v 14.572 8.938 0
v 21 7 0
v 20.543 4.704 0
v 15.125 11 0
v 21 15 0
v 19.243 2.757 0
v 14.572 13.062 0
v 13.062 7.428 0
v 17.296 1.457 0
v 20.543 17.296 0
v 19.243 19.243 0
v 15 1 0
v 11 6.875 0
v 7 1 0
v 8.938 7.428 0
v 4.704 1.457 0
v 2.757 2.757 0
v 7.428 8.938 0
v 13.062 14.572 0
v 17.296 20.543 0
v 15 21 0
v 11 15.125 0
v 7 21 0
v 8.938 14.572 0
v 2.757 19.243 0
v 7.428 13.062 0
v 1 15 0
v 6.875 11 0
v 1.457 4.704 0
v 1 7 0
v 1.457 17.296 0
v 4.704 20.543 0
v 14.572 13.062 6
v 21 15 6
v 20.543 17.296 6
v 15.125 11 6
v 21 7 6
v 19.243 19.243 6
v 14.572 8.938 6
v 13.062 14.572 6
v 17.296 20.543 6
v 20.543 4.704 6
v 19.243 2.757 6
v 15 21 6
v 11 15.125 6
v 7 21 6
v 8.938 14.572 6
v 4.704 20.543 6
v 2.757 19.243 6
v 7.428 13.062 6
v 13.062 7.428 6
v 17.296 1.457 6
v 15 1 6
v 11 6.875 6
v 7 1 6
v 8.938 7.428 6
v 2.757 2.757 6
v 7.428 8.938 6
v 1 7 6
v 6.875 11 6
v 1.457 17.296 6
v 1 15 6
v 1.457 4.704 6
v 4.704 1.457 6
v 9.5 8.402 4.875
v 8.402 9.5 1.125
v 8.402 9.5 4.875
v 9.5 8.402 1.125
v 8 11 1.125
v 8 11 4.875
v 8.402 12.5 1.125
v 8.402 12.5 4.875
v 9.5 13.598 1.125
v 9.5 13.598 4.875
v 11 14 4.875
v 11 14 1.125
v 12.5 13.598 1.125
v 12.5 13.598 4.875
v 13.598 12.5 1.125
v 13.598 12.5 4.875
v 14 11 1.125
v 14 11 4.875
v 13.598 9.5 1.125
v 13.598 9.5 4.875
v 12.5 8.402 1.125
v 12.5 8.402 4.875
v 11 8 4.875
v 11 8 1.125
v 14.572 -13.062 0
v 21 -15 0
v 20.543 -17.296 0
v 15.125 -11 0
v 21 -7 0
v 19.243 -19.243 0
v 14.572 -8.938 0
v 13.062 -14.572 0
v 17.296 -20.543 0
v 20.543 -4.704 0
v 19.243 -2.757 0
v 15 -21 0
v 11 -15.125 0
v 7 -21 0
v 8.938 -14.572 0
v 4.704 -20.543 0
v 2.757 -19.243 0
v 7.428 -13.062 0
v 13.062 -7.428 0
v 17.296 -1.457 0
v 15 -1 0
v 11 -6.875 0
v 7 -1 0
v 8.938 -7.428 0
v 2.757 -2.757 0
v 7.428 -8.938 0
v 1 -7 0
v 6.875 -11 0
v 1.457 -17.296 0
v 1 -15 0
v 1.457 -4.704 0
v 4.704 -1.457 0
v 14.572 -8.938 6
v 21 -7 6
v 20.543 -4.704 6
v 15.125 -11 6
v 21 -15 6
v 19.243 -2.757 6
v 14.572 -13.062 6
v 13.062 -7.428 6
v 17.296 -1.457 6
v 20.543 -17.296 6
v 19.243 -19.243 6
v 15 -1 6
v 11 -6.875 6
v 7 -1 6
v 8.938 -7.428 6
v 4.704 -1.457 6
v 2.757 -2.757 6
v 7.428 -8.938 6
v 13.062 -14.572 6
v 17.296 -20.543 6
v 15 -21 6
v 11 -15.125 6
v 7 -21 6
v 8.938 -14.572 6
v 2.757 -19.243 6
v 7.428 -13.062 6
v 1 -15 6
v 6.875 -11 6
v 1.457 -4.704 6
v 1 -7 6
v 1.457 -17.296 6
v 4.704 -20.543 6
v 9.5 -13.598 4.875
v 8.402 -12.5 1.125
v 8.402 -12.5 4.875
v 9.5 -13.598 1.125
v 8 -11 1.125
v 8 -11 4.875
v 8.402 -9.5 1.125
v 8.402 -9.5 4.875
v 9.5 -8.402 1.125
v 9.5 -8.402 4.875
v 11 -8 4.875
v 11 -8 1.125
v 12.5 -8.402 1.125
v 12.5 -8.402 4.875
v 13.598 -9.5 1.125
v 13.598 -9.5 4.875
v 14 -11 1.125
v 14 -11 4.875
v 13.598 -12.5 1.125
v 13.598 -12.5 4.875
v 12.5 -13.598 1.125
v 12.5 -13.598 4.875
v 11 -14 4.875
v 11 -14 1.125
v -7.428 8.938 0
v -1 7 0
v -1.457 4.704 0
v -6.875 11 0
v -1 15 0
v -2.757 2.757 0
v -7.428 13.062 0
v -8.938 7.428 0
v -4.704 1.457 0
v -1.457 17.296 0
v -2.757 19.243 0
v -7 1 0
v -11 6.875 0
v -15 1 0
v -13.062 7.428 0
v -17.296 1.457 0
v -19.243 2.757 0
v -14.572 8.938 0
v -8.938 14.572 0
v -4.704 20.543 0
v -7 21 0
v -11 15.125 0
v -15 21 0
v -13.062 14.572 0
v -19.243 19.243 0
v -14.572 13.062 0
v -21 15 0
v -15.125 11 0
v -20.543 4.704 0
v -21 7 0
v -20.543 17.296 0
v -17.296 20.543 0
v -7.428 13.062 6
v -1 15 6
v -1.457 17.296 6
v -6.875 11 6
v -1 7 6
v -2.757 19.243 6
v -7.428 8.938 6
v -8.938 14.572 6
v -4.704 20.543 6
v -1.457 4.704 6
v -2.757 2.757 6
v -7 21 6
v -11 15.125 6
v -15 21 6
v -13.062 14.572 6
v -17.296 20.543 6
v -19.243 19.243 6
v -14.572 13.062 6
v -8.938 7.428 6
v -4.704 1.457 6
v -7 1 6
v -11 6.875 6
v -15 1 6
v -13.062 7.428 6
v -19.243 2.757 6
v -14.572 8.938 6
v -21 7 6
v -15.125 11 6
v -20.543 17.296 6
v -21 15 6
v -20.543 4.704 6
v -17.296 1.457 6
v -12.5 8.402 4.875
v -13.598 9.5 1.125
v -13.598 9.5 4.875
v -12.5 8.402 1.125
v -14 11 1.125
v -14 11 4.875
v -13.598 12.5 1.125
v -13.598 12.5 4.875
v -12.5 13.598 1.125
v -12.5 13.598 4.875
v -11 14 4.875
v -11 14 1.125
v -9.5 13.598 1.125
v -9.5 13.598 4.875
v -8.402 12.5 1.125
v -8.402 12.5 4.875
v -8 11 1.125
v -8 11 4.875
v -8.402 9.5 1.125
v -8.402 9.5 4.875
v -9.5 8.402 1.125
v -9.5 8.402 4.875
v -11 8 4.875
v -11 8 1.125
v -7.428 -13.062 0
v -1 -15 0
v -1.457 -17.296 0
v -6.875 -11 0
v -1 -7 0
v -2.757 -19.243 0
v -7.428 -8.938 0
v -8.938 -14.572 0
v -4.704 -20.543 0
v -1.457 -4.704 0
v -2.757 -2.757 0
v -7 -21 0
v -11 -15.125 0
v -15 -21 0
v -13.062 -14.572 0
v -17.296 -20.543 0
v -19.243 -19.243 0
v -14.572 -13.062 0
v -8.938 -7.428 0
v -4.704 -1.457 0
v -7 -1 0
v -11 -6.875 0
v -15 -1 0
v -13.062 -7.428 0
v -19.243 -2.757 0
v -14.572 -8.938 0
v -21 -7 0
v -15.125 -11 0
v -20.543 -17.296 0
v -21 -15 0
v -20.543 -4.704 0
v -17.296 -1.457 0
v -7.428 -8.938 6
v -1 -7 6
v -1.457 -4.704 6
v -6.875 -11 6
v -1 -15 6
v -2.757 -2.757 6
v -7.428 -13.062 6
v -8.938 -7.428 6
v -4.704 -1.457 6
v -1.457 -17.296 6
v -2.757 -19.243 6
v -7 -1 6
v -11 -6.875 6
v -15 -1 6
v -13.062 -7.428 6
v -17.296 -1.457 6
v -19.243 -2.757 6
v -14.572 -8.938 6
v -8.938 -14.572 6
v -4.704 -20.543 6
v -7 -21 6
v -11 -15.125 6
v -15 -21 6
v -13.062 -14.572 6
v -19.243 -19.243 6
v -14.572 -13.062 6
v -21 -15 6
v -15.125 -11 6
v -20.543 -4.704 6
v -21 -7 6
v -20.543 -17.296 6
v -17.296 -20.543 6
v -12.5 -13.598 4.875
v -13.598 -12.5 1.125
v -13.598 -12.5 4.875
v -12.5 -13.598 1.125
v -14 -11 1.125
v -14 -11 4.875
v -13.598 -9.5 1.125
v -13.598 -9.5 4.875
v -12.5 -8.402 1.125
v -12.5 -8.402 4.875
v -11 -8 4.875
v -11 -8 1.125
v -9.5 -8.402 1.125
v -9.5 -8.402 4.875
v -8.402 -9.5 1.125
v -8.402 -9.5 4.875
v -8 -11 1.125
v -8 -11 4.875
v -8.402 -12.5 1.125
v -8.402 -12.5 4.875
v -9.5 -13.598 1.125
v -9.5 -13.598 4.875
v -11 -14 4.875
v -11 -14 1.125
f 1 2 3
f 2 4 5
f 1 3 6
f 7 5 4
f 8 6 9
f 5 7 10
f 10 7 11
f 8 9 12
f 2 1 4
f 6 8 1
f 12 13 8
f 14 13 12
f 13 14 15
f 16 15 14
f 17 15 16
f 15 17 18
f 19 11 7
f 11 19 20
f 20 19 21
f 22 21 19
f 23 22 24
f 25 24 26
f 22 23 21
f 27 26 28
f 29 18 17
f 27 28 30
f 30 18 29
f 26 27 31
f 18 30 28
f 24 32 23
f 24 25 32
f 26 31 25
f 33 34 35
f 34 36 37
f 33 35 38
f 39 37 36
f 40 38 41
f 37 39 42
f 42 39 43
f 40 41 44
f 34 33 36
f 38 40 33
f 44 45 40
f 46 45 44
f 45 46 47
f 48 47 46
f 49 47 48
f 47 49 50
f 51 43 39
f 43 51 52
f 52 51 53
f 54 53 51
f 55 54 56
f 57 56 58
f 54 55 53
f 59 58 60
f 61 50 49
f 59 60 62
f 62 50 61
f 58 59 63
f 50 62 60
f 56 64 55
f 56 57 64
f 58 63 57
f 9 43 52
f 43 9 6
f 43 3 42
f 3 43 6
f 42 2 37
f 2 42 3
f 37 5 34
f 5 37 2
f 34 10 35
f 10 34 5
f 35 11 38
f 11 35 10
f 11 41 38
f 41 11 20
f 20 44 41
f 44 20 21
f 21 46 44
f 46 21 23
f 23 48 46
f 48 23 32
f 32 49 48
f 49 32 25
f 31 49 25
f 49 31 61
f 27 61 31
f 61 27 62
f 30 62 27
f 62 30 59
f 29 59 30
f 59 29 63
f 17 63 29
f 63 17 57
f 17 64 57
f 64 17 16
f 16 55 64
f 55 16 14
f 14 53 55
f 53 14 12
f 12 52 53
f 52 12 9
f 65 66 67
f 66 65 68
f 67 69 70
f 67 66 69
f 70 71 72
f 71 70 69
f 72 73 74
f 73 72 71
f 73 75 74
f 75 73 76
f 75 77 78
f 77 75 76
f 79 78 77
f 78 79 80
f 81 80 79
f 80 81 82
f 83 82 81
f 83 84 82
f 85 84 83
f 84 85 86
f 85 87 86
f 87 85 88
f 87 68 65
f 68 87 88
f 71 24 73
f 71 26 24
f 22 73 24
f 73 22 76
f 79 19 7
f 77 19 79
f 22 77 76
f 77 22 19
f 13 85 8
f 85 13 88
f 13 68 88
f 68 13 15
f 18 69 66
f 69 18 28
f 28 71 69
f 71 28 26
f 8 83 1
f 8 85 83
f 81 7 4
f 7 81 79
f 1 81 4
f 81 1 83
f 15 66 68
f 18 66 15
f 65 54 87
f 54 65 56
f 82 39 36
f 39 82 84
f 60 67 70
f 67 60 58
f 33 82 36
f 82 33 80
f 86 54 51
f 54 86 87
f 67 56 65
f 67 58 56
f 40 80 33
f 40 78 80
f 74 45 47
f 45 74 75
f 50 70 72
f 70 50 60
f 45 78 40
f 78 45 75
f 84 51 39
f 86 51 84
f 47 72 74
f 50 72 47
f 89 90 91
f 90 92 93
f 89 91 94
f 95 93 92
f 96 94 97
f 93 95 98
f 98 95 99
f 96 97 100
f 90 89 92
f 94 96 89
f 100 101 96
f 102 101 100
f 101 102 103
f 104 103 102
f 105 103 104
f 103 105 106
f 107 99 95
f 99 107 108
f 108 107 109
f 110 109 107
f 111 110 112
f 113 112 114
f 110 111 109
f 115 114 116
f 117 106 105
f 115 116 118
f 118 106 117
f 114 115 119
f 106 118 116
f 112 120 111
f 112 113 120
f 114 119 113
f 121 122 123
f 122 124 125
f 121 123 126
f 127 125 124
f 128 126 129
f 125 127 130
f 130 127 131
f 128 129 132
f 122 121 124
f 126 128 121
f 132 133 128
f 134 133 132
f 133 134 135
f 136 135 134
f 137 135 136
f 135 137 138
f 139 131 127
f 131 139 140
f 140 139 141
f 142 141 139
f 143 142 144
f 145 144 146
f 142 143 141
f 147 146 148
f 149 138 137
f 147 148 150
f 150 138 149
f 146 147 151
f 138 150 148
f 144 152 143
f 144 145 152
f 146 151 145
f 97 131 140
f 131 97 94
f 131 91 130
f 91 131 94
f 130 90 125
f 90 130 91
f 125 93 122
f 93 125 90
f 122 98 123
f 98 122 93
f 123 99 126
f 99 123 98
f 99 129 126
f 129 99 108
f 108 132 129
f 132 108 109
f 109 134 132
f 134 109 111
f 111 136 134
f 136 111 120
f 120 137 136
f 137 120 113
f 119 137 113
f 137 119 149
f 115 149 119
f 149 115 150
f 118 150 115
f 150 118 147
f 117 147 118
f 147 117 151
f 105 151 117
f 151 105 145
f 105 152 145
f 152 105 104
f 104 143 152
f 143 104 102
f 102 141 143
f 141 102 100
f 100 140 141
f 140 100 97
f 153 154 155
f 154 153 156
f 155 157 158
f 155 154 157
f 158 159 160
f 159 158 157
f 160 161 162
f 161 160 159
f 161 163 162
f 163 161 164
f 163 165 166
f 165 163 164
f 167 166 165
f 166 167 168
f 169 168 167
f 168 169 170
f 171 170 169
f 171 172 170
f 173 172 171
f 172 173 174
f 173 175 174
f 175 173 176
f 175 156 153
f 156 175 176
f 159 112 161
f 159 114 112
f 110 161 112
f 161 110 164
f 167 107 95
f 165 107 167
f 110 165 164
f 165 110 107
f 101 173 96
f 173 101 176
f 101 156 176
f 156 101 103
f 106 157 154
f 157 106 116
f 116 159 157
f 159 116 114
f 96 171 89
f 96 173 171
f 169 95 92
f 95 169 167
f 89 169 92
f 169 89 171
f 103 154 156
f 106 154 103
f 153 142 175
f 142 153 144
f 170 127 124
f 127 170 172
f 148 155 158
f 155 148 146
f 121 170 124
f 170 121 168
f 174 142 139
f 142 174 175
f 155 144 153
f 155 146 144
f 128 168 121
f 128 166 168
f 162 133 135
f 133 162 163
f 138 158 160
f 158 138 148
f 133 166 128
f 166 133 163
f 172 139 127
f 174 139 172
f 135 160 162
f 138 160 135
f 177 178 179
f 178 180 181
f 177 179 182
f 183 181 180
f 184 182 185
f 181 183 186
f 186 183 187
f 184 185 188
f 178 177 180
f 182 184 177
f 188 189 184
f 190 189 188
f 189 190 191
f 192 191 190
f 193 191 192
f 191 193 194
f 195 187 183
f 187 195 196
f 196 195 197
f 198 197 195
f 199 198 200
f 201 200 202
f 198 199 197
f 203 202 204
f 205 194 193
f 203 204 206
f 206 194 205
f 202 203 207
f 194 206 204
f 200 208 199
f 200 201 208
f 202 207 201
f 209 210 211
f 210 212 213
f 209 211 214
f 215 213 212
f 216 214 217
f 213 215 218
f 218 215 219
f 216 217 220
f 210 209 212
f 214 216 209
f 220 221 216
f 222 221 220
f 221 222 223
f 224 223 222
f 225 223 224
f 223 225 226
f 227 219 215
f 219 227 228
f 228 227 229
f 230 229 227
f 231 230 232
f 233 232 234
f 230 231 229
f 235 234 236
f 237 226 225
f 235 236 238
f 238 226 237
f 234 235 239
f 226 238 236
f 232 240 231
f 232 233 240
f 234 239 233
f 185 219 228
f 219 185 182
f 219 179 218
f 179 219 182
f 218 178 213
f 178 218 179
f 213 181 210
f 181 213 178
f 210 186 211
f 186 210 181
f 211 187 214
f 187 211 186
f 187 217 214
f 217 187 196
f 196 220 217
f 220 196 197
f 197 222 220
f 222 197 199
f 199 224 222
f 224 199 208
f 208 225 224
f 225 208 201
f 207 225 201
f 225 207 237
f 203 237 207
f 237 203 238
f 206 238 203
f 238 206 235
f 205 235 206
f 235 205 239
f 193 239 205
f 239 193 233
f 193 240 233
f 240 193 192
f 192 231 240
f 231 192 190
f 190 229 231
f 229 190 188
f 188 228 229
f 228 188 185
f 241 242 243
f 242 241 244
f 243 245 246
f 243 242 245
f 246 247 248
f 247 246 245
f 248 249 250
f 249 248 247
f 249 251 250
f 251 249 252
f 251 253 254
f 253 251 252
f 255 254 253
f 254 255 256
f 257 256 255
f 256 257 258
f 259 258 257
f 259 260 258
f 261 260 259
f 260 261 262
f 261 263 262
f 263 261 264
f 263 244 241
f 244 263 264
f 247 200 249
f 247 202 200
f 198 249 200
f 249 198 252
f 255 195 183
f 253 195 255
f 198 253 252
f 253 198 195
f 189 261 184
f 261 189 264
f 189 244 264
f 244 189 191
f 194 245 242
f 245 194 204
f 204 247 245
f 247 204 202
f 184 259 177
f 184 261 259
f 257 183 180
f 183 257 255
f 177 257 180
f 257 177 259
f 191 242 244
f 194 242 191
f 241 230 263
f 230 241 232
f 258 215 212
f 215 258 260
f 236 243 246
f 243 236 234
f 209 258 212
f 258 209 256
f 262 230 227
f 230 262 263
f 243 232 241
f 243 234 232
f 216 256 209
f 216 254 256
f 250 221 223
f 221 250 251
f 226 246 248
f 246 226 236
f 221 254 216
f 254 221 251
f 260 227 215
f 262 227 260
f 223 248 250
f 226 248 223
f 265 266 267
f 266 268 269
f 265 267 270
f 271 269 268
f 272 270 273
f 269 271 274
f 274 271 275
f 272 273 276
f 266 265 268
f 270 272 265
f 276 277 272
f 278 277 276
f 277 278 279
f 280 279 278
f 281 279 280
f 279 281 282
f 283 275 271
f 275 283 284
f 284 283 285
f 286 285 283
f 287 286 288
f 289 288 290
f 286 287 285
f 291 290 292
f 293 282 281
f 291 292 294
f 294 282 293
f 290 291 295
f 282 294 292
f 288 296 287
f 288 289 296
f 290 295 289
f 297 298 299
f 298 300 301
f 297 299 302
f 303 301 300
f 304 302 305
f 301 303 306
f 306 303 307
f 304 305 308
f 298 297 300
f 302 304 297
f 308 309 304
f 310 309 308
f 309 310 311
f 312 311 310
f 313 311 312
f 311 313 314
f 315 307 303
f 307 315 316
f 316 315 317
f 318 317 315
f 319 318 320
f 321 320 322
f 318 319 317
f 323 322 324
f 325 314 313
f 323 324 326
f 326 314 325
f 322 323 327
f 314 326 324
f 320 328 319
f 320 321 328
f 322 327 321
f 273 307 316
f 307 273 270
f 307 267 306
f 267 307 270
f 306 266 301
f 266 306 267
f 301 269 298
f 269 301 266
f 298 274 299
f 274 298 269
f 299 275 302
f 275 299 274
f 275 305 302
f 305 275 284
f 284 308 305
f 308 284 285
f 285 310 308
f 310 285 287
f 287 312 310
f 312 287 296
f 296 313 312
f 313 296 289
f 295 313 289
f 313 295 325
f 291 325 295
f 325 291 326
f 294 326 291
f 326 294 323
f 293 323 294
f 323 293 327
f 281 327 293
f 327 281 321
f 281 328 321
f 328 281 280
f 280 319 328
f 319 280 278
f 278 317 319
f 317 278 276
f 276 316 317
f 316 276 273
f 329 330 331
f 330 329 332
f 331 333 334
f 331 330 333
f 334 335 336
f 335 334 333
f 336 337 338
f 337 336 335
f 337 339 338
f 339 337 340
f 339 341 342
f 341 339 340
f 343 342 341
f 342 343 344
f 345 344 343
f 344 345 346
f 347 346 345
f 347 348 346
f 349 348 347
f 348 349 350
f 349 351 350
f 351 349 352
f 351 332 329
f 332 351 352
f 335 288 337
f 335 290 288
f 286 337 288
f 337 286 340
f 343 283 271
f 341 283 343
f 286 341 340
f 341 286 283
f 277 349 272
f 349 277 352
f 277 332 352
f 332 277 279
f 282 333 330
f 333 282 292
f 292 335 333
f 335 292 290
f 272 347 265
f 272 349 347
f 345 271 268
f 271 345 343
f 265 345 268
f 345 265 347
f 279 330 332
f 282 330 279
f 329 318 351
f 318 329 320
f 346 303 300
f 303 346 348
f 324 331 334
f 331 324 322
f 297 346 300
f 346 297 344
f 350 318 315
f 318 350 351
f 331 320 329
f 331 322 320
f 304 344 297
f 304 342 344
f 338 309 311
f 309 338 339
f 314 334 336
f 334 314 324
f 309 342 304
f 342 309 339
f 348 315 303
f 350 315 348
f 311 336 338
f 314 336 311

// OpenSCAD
include <wallace.scad>;

!for(x = [1, -1]) for(y = [1, -1]) translate([x * (rod_size * 1.5 + 2), y * (rod_size * 1.5 + 2), 0]) foot();
